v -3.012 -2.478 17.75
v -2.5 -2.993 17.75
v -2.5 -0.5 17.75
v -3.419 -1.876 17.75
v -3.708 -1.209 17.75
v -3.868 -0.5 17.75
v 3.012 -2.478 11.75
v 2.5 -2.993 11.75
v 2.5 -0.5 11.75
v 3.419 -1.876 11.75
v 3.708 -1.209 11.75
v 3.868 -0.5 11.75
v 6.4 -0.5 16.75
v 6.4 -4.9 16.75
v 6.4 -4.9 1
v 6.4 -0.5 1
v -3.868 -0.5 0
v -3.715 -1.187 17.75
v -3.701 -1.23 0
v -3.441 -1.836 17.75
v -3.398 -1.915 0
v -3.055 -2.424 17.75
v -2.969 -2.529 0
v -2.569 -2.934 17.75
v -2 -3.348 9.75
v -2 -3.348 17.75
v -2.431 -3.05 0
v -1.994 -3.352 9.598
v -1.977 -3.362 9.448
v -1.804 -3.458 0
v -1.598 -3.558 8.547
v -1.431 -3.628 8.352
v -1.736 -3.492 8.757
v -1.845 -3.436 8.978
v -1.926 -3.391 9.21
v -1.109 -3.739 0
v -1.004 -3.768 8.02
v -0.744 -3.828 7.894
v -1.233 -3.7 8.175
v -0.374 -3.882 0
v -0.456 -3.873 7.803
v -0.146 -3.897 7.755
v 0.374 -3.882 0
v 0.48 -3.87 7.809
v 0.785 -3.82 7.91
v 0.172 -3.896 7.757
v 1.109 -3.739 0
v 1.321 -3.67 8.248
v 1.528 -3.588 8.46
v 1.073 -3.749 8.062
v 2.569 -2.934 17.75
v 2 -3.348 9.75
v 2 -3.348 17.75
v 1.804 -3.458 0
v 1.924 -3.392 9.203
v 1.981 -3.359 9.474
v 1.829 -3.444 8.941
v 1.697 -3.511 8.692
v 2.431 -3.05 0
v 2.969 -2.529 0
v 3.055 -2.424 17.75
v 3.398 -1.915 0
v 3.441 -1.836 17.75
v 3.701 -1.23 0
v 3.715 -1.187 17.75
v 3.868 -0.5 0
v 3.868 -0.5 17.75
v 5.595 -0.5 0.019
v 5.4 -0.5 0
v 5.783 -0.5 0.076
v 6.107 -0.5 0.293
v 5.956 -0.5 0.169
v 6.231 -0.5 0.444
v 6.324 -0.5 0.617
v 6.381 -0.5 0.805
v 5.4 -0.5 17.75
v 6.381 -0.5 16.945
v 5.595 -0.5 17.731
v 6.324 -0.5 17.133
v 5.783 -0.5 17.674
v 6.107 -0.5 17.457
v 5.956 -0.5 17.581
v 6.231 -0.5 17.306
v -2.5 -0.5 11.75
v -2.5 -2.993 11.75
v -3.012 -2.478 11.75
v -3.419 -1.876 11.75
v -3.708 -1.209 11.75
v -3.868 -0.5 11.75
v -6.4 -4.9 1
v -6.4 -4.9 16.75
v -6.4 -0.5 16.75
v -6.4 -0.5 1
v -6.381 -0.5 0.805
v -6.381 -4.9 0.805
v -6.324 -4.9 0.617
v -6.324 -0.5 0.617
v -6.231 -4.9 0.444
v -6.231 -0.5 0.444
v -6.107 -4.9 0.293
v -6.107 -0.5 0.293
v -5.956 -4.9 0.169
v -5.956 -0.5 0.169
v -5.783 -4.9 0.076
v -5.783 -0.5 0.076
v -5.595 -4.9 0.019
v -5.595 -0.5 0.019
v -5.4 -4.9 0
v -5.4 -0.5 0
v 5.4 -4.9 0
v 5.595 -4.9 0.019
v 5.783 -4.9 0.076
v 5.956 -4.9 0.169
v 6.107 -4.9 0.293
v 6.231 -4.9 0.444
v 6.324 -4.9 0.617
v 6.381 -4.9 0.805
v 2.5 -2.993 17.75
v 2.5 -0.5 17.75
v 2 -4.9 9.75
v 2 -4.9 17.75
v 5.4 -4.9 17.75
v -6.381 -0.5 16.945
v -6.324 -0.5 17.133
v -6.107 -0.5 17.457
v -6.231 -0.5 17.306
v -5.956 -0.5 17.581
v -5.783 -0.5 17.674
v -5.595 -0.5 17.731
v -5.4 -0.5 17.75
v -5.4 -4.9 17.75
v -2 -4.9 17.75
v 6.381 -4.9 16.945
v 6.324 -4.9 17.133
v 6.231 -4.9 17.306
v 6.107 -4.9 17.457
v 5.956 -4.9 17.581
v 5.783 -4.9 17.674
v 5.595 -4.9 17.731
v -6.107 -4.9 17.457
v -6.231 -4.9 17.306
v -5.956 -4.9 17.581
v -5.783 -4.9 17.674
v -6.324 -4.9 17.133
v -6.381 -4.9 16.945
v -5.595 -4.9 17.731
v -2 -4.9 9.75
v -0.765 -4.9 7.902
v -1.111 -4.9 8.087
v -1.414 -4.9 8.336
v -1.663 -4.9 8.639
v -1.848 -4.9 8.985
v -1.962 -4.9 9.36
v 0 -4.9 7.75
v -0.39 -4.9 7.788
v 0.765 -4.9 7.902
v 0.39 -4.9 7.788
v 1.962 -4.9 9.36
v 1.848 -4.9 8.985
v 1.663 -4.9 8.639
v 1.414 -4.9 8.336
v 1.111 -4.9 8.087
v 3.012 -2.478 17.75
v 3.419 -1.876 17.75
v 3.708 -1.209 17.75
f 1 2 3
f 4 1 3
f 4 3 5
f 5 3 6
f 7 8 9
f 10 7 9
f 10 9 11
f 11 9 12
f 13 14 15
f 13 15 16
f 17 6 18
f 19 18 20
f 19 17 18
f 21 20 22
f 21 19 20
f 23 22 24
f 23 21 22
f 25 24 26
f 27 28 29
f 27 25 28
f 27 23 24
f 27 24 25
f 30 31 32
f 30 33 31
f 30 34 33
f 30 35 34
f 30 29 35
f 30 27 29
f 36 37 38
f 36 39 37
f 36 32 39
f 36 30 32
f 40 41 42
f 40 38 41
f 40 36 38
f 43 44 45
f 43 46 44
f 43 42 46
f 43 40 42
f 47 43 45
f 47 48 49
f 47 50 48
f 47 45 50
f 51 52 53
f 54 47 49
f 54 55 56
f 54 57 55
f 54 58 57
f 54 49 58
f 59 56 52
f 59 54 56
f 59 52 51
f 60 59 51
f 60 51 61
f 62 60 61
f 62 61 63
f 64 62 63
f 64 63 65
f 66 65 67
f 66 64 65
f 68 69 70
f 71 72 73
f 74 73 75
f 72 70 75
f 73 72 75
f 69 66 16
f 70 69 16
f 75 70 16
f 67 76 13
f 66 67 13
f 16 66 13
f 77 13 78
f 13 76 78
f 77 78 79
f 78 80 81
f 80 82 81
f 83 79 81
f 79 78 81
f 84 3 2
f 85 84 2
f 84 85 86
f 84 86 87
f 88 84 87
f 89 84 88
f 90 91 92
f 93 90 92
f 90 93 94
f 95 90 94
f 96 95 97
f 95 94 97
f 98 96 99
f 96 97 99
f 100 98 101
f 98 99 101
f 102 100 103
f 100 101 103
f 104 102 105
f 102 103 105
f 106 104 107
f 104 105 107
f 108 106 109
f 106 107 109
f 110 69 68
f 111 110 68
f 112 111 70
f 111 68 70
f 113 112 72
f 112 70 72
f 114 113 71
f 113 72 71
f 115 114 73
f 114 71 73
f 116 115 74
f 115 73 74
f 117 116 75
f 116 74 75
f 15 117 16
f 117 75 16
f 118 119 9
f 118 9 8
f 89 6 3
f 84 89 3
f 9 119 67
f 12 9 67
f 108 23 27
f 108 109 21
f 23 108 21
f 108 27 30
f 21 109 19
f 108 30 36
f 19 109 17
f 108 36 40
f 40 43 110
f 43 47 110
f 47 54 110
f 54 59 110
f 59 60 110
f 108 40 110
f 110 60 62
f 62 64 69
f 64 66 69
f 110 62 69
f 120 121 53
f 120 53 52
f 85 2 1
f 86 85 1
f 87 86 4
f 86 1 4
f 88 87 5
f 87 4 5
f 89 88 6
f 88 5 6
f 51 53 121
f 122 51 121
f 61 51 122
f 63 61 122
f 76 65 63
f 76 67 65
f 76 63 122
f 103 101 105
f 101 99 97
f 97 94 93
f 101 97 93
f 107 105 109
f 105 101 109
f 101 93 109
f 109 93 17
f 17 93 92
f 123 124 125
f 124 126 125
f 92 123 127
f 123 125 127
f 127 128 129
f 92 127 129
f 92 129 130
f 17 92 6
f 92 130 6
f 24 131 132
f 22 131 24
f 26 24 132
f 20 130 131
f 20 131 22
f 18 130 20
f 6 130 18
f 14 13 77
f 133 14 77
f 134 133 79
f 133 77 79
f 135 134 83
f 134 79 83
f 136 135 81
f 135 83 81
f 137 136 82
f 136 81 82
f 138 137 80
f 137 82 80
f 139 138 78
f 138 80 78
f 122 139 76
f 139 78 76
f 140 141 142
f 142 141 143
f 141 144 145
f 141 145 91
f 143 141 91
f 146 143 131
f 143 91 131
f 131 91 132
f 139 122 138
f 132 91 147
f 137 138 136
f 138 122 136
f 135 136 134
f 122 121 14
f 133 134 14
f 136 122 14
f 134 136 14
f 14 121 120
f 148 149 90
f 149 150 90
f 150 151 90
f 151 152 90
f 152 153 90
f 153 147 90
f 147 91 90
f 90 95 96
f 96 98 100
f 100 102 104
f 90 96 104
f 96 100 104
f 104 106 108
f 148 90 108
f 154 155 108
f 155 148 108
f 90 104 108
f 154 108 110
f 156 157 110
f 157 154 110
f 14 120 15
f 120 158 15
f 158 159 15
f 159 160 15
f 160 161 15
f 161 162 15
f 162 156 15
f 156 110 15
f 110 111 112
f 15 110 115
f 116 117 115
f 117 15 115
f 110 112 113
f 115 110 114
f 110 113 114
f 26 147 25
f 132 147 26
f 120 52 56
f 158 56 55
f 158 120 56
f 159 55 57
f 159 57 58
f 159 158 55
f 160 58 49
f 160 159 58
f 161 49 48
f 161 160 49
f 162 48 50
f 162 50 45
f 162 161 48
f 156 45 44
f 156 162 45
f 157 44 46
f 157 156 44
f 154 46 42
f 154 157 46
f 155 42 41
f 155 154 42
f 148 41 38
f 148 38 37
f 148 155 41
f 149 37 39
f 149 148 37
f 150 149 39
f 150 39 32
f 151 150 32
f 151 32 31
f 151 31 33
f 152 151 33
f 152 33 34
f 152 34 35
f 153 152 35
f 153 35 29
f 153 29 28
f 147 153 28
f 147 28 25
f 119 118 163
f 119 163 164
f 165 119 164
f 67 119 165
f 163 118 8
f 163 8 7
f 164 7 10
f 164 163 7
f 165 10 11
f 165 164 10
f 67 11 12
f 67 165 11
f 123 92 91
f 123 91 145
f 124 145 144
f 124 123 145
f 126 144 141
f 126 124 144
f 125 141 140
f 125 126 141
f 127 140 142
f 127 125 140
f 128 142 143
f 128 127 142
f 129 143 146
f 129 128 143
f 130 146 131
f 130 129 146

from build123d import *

# Parameters (mm, degrees)
SKETCH1_W             = 12.8
SKETCH1_H             = 9.8
SKETCH1_R             = 3.9
BOSS_EXTRUDE1_DEPTH   = 17.75
CUT_EXTRUDE4_DEPTH    = 10
BOSS_EXTRUDE3_DEPTH   = 6
BOSS_EXTRUDE3_2_DEPTH = 6
FILLET1_R             = 1
SKETCH10_W            = 12.8
SKETCH10_H            = 1
CUT_EXTRUDE5_DEPTH    = 20.494422395
SKETCH11_W            = 19.0923633
SKETCH11_H            = 7.42480795
CUT_EXTRUDE6_DEPTH    = 23.425710792


with BuildPart() as part:
    # Sketch1 → Boss-Extrude1 (new body)
    with BuildSketch(Plane.XY):
        Rectangle(SKETCH1_W, SKETCH1_H)
        Circle(SKETCH1_R, mode=Mode.SUBTRACT)
    extrude(amount=BOSS_EXTRUDE1_DEPTH)

    # Sketch6 → Cut-Extrude4 (cut)
    with BuildSketch(Plane(origin=(0, -4.9, 0), x_dir=(-1, 0, 0), z_dir=(0, -1, 0))):
        with BuildLine():
            Line((2, -9.75), (2, -17.75))
            ThreePointArc((2, -17.75), (0, -19.75), (-2, -17.75))
            Line((-2, -17.75), (-2, -9.75))
            ThreePointArc((-2, -9.75), (0, -7.75), (2, -9.75))
        make_face()
    extrude(amount=-CUT_EXTRUDE4_DEPTH, mode=Mode.SUBTRACT)

    # Fillet1
    fillet1_edges = [part.edges().sort_by_distance(p)[0] for p in [
        (-6.4, 0, 17.75),
        (6.4, 0, 17.75),
        (-6.4, 0, 0),
        (6.4, 0, 0),
    ]]
    fillet(fillet1_edges, radius=FILLET1_R)


with BuildPart() as body_2:
    # Sketch9 → Boss-Extrude3 (new body)
    with BuildSketch(Plane.XY.offset(17.75)):
        with BuildLine():
            Line((-2.5, 2.993325909), (-2.5, -2.993325909))
            ThreePointArc((-2.5, -2.993325909), (-3.9, 0), (-2.5, 2.993325909))
        make_face()
    extrude(amount=-BOSS_EXTRUDE3_DEPTH)


with BuildPart() as body_3:
    # Sketch9 → Boss-Extrude3 2 (new body)
    with BuildSketch(Plane.XY.offset(17.75)):
        with BuildLine():
            Line((2.5, 2.993325909), (2.5, -2.993325909))
            ThreePointArc((2.5, -2.993325909), (3.9, 0), (2.5, 2.993325909))
        make_face()
    extrude(amount=-BOSS_EXTRUDE3_2_DEPTH)


with BuildPart() as cut_extrude5_tool:
    # Sketch10 → Cut-Extrude5 (new, through all)
    with BuildSketch(Plane.XY.offset(17.75)):
        Rectangle(SKETCH10_W, SKETCH10_H)
    extrude(amount=-CUT_EXTRUDE5_DEPTH)


with BuildPart() as part_1:
    add(part.part)

    # Cut-Extrude5: cut by cut_extrude5_tool
    add(cut_extrude5_tool.part, mode=Mode.SUBTRACT)


with BuildPart() as body_2_1:
    add(body_2.part)

    # Cut-Extrude5: cut by cut_extrude5_tool
    add(cut_extrude5_tool.part, mode=Mode.SUBTRACT)


with BuildPart() as body_3_1:
    add(body_3.part)

    # Cut-Extrude5: cut by cut_extrude5_tool
    add(cut_extrude5_tool.part, mode=Mode.SUBTRACT)


with BuildPart() as cut_extrude5_piece_1:
    # of the separate pieces the step leaves, piece 1, a body of its own (cut_extrude5_pieces)
    add(part_1.part.solids().sort_by_distance((-5.4, -4.9, 0))[0])


with BuildPart() as cut_extrude5_piece_2:
    # of the separate pieces the step leaves, piece 2, a body of its own (cut_extrude5_pieces)
    add(part_1.part.solids().sort_by_distance((-5.4, 4.9, 0))[0])


with BuildPart() as cut_extrude5_piece_1_of_body_2:
    # of the separate pieces the step leaves, piece 1, a body of its own (cut_extrude5_pieces_of_body_2)
    add(body_2_1.part.solids().sort_by_distance((-2.5, -0.5, 17.75))[0])


with BuildPart() as cut_extrude5_piece_2_of_body_2:
    # of the separate pieces the step leaves, piece 2, a body of its own (cut_extrude5_pieces_of_body_2)
    add(body_2_1.part.solids().sort_by_distance((-2.5, 2.993325909, 17.75))[0])


with BuildPart() as cut_extrude5_piece_1_of_body_3:
    # of the separate pieces the step leaves, piece 1, a body of its own (cut_extrude5_pieces_of_body_3)
    add(body_3_1.part.solids().sort_by_distance((2.5, -0.5, 17.75))[0])


with BuildPart() as cut_extrude5_piece_2_of_body_3:
    # of the separate pieces the step leaves, piece 2, a body of its own (cut_extrude5_pieces_of_body_3)
    add(body_3_1.part.solids().sort_by_distance((2.5, 2.993325909, 17.75))[0])


with BuildPart() as cut_extrude6_tool:
    # Sketch11 → Cut-Extrude6 (new, through all)
    with BuildSketch(Plane(origin=(6.4, 0, 0), x_dir=(0, 0, -1), z_dir=(1, 0, 0))):
        with Locations((-8.735389822, 3.368397429)):
            Rectangle(SKETCH11_W, SKETCH11_H)
    extrude(amount=-CUT_EXTRUDE6_DEPTH)


with BuildPart() as cut_extrude5_piece_2_1:
    add(cut_extrude5_piece_2.part)

    # Cut-Extrude6: cut by cut_extrude6_tool
    add(cut_extrude6_tool.part, mode=Mode.SUBTRACT)


with BuildPart() as cut_extrude5_piece_2_of_body_2_1:
    add(cut_extrude5_piece_2_of_body_2.part)

    # Cut-Extrude6: cut by cut_extrude6_tool
    add(cut_extrude6_tool.part, mode=Mode.SUBTRACT)


with BuildPart() as cut_extrude5_piece_2_of_body_3_1:
    add(cut_extrude5_piece_2_of_body_3.part)

    # Cut-Extrude6: cut by cut_extrude6_tool
    add(cut_extrude6_tool.part, mode=Mode.SUBTRACT)


solid = Compound([cut_extrude5_piece_1.part, cut_extrude5_piece_1_of_body_2.part, cut_extrude5_piece_1_of_body_3.part])
